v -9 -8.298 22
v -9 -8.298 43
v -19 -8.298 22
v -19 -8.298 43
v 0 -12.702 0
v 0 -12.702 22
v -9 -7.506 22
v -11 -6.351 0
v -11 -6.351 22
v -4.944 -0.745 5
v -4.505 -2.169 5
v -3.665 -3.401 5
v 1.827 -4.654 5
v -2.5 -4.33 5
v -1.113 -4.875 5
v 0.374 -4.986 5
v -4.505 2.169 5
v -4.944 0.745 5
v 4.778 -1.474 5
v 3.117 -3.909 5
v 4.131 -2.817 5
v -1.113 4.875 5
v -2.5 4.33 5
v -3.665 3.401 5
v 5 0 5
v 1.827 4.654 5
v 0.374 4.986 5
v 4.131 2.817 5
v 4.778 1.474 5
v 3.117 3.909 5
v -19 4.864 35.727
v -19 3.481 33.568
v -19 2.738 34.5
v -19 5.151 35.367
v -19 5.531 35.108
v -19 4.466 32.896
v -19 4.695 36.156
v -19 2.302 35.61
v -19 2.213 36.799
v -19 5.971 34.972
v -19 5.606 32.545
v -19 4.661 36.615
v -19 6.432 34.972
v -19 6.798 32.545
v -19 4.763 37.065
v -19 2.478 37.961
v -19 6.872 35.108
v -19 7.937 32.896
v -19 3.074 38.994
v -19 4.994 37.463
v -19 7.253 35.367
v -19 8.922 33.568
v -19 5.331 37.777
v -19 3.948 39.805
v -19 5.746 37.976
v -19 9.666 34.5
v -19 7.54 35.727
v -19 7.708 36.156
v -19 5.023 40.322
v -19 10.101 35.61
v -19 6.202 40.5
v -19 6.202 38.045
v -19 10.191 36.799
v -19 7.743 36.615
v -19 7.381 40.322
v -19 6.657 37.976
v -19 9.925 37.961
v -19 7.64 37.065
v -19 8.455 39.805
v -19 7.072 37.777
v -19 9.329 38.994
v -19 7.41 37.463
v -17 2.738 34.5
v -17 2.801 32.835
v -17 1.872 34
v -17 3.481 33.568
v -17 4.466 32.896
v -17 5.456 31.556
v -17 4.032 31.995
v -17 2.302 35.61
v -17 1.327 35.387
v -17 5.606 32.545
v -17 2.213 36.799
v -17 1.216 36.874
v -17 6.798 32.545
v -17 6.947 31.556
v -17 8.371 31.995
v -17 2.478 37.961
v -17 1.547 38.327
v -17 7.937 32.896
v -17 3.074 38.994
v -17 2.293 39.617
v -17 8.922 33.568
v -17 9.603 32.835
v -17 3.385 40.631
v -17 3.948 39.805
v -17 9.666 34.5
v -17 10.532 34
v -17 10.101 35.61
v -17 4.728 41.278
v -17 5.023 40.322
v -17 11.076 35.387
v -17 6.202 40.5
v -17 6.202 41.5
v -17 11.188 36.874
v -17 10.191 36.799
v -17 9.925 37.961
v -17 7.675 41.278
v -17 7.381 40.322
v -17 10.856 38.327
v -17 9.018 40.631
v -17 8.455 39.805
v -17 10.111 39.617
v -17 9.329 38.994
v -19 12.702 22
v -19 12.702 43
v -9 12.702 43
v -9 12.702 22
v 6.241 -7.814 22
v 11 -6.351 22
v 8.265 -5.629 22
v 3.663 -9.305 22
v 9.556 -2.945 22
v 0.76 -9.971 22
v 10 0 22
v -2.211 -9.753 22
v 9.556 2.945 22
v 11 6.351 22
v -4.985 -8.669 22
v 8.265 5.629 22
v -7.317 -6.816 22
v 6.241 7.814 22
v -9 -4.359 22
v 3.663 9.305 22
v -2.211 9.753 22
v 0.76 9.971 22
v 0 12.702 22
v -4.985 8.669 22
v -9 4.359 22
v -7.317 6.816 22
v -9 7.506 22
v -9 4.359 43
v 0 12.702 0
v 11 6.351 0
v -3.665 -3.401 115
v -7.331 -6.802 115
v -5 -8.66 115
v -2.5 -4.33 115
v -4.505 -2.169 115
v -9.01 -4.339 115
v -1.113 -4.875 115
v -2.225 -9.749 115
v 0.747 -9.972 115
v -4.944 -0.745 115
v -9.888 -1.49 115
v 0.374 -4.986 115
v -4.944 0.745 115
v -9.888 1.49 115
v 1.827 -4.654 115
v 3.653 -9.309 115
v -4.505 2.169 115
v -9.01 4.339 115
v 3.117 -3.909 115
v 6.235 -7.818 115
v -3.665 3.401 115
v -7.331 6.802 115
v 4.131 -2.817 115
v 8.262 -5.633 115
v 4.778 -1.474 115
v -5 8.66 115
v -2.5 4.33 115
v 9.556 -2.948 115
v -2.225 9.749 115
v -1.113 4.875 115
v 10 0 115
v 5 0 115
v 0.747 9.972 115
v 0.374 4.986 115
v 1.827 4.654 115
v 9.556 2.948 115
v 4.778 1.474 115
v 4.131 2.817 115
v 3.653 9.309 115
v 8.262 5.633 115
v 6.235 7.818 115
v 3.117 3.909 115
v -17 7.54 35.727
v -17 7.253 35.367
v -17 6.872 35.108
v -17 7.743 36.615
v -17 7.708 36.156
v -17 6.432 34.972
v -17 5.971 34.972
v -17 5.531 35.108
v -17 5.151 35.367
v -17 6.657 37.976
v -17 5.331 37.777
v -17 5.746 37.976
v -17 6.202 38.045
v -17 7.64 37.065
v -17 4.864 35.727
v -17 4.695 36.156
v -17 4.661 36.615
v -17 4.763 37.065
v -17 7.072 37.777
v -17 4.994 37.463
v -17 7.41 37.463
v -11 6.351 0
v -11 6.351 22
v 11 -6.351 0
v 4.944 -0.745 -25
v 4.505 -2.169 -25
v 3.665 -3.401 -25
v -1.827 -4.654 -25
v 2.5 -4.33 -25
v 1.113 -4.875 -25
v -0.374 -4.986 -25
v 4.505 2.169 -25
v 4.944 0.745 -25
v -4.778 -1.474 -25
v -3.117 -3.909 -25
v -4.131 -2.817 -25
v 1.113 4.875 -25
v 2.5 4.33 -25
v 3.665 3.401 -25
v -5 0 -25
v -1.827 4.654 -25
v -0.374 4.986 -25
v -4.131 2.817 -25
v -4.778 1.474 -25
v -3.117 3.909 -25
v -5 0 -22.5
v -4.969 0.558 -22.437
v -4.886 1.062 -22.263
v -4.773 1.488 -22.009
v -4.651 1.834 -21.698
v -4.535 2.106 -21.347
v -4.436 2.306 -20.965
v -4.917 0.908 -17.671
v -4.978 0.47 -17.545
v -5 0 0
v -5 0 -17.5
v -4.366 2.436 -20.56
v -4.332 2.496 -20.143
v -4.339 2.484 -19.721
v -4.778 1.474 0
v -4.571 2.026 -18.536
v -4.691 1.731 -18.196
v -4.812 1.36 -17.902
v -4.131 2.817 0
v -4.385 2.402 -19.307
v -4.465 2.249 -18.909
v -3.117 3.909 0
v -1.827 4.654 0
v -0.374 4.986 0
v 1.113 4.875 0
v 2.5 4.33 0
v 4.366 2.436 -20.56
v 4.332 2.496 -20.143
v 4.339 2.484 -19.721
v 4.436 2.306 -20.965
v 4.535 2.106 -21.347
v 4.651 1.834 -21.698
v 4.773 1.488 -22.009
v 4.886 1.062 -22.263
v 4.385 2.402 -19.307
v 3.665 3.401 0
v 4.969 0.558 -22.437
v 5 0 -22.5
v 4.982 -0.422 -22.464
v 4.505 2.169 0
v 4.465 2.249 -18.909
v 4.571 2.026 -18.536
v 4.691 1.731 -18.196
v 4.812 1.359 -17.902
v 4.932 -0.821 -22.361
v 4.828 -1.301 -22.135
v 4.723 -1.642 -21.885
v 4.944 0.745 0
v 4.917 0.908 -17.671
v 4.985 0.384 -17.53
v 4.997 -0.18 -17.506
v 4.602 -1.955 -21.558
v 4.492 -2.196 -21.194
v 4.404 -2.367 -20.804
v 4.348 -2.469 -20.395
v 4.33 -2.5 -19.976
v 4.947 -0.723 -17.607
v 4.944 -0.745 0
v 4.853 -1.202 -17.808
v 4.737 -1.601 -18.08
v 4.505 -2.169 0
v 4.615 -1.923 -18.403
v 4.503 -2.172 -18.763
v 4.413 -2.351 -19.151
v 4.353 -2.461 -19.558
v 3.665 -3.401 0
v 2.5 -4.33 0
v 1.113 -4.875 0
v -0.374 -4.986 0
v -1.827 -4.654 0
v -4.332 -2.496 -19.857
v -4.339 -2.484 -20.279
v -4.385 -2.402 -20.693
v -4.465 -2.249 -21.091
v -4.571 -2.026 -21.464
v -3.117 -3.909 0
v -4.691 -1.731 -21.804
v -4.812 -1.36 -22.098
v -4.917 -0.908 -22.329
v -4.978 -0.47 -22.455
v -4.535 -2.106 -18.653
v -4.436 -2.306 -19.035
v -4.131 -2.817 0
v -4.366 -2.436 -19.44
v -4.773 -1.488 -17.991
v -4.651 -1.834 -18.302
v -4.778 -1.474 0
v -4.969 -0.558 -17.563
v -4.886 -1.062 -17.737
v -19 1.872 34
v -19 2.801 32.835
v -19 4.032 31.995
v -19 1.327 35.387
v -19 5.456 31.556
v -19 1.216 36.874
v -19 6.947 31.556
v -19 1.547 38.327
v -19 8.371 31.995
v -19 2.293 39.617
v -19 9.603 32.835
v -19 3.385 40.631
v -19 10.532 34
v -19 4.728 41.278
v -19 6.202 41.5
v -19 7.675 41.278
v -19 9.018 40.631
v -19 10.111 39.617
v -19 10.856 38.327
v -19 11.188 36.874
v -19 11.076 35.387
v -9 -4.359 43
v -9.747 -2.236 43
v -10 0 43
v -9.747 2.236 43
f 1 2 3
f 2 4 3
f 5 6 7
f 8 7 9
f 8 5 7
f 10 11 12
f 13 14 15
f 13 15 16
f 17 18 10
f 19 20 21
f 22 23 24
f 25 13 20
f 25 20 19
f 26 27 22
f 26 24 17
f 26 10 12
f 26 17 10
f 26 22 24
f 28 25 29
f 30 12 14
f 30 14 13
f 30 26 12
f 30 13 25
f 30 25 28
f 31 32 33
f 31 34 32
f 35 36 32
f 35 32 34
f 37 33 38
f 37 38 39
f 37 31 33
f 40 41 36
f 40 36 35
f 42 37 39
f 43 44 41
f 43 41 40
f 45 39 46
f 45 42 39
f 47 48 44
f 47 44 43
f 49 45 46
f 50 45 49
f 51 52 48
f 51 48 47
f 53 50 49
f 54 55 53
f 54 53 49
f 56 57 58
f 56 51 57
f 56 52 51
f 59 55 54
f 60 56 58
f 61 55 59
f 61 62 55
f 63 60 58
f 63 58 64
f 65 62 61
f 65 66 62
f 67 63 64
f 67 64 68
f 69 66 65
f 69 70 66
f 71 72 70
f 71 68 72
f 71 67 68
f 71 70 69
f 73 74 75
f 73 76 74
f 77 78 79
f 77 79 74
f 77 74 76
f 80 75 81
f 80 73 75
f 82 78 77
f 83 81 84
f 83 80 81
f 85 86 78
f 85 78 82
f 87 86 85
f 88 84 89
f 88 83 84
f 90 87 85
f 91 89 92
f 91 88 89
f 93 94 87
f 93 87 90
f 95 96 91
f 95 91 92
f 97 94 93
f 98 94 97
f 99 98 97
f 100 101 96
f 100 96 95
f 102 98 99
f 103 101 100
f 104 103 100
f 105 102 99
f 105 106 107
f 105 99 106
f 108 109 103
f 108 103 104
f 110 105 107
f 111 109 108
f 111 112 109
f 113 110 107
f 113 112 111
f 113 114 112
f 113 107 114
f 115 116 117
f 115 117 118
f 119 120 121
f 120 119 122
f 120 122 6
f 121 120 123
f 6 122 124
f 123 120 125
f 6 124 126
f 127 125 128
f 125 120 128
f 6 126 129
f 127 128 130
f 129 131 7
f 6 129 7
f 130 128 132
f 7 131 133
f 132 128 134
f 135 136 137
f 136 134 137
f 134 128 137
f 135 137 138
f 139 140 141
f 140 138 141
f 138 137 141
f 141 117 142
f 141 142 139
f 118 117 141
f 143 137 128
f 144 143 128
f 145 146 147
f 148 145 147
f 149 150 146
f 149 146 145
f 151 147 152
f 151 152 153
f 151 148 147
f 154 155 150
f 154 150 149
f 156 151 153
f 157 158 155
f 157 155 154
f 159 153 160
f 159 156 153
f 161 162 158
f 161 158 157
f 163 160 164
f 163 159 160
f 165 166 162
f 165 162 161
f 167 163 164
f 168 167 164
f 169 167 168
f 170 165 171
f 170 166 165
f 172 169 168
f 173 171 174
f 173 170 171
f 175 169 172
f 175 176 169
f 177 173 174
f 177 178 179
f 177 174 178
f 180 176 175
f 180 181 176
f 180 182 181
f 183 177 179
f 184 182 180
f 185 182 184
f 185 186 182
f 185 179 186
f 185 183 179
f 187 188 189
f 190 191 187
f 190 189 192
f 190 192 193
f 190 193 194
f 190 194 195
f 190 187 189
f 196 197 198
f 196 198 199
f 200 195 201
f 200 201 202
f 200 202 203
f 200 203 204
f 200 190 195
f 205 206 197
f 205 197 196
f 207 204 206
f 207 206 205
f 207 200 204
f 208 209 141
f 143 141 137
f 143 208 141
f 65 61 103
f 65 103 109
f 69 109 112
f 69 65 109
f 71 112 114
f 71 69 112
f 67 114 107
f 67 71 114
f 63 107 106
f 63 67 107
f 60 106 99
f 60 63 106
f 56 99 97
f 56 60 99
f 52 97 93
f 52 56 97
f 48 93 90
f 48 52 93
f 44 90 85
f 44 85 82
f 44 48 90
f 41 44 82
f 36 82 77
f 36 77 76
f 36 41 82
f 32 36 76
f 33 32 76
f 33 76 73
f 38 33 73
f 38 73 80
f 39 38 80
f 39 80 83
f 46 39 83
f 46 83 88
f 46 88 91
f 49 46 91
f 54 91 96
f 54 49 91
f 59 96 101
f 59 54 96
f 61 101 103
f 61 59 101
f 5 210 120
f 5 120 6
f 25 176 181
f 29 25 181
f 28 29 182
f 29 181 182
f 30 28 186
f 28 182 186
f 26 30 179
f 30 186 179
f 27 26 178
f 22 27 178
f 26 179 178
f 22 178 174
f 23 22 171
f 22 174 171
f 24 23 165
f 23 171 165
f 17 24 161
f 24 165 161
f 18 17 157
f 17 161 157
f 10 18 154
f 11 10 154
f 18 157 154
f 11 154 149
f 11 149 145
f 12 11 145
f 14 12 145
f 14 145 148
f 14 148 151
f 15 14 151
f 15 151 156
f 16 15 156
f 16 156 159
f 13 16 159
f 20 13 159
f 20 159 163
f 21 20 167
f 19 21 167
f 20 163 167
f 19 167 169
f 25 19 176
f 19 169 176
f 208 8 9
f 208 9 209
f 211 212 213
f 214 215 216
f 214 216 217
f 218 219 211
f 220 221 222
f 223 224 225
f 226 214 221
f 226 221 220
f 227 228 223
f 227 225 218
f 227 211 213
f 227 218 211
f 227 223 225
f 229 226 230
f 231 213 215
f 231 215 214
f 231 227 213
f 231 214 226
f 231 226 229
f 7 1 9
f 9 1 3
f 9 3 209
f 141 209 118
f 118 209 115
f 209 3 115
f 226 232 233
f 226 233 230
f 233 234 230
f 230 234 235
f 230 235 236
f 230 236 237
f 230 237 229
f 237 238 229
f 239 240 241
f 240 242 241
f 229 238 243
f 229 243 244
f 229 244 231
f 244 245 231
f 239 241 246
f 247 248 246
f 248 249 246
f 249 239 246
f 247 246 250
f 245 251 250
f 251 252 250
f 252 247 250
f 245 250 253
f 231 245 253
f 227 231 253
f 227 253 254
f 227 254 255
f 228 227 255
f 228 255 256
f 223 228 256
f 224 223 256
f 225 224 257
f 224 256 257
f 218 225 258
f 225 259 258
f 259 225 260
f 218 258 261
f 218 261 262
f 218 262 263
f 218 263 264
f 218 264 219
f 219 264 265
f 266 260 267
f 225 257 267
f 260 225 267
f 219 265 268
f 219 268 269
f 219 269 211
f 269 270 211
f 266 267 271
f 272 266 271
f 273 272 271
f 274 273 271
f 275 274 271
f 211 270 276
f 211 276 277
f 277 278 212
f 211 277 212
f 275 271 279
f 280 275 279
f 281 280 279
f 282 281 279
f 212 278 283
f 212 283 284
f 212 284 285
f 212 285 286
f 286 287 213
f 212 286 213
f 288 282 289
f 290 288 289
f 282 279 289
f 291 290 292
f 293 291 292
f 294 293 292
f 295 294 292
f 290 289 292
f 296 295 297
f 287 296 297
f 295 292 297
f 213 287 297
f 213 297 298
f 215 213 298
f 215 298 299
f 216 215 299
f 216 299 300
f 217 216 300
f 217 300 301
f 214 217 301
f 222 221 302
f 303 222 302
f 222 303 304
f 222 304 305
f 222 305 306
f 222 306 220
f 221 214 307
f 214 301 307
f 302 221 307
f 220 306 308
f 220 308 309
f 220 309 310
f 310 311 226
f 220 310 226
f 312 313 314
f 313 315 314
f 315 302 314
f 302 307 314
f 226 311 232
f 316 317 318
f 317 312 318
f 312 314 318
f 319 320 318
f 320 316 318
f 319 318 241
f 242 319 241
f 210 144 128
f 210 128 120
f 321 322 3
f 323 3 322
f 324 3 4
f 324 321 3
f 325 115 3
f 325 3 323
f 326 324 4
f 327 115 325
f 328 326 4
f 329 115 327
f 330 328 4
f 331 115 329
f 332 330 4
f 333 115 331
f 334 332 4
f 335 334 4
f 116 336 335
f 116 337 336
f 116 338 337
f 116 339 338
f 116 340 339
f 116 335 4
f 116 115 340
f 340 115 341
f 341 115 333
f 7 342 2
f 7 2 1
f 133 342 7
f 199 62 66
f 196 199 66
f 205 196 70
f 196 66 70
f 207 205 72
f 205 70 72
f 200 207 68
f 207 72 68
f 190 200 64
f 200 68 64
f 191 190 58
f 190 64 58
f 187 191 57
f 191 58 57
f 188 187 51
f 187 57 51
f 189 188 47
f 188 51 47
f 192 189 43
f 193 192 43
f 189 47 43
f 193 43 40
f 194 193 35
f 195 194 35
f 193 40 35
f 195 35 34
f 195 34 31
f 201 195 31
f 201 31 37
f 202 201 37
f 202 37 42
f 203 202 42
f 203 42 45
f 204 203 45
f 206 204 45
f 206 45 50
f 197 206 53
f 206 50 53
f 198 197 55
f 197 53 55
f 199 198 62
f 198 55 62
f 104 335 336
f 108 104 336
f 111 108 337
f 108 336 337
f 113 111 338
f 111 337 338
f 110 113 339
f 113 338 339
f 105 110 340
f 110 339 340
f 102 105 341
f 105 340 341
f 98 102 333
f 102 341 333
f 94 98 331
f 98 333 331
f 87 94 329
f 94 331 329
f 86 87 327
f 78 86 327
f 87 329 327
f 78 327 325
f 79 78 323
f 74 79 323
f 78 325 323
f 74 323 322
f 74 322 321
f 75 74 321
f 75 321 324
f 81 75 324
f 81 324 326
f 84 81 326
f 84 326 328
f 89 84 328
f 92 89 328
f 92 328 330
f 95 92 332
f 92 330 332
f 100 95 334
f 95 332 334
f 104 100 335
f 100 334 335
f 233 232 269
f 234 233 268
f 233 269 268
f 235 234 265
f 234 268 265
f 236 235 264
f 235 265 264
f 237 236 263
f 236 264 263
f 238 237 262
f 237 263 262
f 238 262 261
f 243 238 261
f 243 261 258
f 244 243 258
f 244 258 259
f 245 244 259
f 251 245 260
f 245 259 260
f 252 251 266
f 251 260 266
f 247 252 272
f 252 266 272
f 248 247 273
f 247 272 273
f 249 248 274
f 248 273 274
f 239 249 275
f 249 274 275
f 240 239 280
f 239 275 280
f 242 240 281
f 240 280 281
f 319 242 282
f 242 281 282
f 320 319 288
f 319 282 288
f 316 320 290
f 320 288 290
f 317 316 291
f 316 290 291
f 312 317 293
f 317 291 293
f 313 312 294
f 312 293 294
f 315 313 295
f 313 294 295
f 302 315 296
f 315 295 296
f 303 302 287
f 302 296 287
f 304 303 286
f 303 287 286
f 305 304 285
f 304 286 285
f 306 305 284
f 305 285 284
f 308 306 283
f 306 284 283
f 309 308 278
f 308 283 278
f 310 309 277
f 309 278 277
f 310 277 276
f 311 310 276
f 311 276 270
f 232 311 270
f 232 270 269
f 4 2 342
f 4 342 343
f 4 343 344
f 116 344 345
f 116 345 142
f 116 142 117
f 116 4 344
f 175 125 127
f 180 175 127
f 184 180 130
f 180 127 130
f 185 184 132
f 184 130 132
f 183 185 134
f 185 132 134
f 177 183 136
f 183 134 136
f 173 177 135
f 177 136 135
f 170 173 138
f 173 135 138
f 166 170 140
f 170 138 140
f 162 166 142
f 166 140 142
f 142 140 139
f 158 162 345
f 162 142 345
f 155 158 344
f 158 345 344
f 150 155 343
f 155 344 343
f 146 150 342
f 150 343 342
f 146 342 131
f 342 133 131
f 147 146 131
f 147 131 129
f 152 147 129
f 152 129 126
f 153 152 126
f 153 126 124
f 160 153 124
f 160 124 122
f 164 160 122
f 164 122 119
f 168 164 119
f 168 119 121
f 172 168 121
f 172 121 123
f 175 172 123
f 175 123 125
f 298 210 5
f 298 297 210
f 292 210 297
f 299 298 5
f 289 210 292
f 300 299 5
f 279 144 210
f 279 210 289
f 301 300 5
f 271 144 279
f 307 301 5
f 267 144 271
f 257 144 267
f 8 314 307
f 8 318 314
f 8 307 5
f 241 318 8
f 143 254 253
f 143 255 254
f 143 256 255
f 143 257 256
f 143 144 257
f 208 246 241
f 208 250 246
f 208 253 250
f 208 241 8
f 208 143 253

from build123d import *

# Parameters (mm, degrees)
SKETCH1_R               = 10
BOSS_EXTRUDE1_DEPTH     = 115
SKETCH2_R               = 5
BOSS_EXTRUDE2_DEPTH     = 25
SKETCH3_R               = 5
CUT_EXTRUDE1_DEPTH      = 110
SKETCH4_R               = 2.5
CUT_EXTRUDE2_DEPTH      = 11
CUT_EXTRUDE2_DEPTH_BACK = 11
SKETCH5_R               = 10
BOSS_EXTRUDE3_DEPTH     = 22
SKETCH6_W               = 21
SKETCH6_H               = 21
BOSS_EXTRUDE4_DEPTH     = 8
SKETCH7_W               = 21
SKETCH7_H               = 21
BOSS_EXTRUDE5_DEPTH     = 2
SKETCH8_R               = 5
SKETCH8_R_2             = 4
CUT_EXTRUDE3_DEPTH      = 2
SKETCH9_R               = 1.545135807
CUT_EXTRUDE4_DEPTH      = 2


with BuildPart() as part:
    # Sketch1 → Boss-Extrude1 (new body)
    with BuildSketch(Plane.XY):
        Circle(SKETCH1_R)
    extrude(amount=BOSS_EXTRUDE1_DEPTH)

    # Sketch2 → Boss-Extrude2 (add)
    with BuildSketch(Plane(origin=(0, 0, 0), x_dir=(-1, 0, 0), z_dir=(0, 0, -1))):
        Circle(SKETCH2_R)
    extrude(amount=BOSS_EXTRUDE2_DEPTH)

    # Sketch3 → Cut-Extrude1 (cut)
    with BuildSketch(Plane.XY.offset(115)):
        Circle(SKETCH3_R)
    extrude(amount=-CUT_EXTRUDE1_DEPTH, mode=Mode.SUBTRACT)

    # Sketch4 → Cut-Extrude2 (cut, two sides)
    with BuildSketch(Plane(origin=(0, 0, 0), x_dir=(0, 0, -1), z_dir=(1, 0, 0))) as cut_extrude2_sk:
        with Locations((20, 0)):
            Circle(SKETCH4_R)
    extrude(amount=CUT_EXTRUDE2_DEPTH, mode=Mode.SUBTRACT)
    extrude(cut_extrude2_sk.sketch, amount=-CUT_EXTRUDE2_DEPTH_BACK, mode=Mode.SUBTRACT)

    # Sketch5 → Boss-Extrude3 (add)
    with BuildSketch(Plane(origin=(0, 0, 0), x_dir=(-1, 0, 0), z_dir=(0, 0, -1))):
        Polygon((0, -12.701705922), (11, -6.350852961), (11, 6.350852961), (0, 12.701705922), (-11, 6.350852961), (-11, -6.350852961), align=None)
        Circle(SKETCH5_R, mode=Mode.SUBTRACT)
    extrude(amount=-BOSS_EXTRUDE3_DEPTH)



with BuildPart() as body_2:
    # Sketch6 → Boss-Extrude4 (new body)
    with BuildSketch(Plane.ZY.offset(11)):
        with Locations((32.5, 2.201705922)):
            Rectangle(SKETCH6_W, SKETCH6_H)
    extrude(amount=BOSS_EXTRUDE4_DEPTH)


with BuildPart() as part_1:
    add(part.part)

    add(body_2.part)  # Boss-Extrude5 merges body 2
    # Sketch7 → Boss-Extrude5 (add)
    with BuildSketch(Plane(origin=(-11, 0, 0), x_dir=(0, 0, -1), z_dir=(1, 0, 0))):
        with Locations((-32.5, 2.201705922)):
            Rectangle(SKETCH7_W, SKETCH7_H)
    extrude(amount=BOSS_EXTRUDE5_DEPTH)

    # Sketch8 → Cut-Extrude3 (cut)
    with BuildSketch(Plane.ZY.offset(19)):
        with Locations((36.5, 6.201705922)):
            Circle(SKETCH8_R)
        with Locations((36.5, 6.201705922)):
            Circle(SKETCH8_R_2, mode=Mode.SUBTRACT)
    extrude(amount=-CUT_EXTRUDE3_DEPTH, mode=Mode.SUBTRACT)

    # Sketch9 → Cut-Extrude4 (cut)
    with BuildSketch(Plane.ZY.offset(19)):
        with Locations((36.5, 6.201705922)):
            Circle(SKETCH9_R)
    extrude(amount=-CUT_EXTRUDE4_DEPTH, mode=Mode.SUBTRACT)


solid = part_1.part
